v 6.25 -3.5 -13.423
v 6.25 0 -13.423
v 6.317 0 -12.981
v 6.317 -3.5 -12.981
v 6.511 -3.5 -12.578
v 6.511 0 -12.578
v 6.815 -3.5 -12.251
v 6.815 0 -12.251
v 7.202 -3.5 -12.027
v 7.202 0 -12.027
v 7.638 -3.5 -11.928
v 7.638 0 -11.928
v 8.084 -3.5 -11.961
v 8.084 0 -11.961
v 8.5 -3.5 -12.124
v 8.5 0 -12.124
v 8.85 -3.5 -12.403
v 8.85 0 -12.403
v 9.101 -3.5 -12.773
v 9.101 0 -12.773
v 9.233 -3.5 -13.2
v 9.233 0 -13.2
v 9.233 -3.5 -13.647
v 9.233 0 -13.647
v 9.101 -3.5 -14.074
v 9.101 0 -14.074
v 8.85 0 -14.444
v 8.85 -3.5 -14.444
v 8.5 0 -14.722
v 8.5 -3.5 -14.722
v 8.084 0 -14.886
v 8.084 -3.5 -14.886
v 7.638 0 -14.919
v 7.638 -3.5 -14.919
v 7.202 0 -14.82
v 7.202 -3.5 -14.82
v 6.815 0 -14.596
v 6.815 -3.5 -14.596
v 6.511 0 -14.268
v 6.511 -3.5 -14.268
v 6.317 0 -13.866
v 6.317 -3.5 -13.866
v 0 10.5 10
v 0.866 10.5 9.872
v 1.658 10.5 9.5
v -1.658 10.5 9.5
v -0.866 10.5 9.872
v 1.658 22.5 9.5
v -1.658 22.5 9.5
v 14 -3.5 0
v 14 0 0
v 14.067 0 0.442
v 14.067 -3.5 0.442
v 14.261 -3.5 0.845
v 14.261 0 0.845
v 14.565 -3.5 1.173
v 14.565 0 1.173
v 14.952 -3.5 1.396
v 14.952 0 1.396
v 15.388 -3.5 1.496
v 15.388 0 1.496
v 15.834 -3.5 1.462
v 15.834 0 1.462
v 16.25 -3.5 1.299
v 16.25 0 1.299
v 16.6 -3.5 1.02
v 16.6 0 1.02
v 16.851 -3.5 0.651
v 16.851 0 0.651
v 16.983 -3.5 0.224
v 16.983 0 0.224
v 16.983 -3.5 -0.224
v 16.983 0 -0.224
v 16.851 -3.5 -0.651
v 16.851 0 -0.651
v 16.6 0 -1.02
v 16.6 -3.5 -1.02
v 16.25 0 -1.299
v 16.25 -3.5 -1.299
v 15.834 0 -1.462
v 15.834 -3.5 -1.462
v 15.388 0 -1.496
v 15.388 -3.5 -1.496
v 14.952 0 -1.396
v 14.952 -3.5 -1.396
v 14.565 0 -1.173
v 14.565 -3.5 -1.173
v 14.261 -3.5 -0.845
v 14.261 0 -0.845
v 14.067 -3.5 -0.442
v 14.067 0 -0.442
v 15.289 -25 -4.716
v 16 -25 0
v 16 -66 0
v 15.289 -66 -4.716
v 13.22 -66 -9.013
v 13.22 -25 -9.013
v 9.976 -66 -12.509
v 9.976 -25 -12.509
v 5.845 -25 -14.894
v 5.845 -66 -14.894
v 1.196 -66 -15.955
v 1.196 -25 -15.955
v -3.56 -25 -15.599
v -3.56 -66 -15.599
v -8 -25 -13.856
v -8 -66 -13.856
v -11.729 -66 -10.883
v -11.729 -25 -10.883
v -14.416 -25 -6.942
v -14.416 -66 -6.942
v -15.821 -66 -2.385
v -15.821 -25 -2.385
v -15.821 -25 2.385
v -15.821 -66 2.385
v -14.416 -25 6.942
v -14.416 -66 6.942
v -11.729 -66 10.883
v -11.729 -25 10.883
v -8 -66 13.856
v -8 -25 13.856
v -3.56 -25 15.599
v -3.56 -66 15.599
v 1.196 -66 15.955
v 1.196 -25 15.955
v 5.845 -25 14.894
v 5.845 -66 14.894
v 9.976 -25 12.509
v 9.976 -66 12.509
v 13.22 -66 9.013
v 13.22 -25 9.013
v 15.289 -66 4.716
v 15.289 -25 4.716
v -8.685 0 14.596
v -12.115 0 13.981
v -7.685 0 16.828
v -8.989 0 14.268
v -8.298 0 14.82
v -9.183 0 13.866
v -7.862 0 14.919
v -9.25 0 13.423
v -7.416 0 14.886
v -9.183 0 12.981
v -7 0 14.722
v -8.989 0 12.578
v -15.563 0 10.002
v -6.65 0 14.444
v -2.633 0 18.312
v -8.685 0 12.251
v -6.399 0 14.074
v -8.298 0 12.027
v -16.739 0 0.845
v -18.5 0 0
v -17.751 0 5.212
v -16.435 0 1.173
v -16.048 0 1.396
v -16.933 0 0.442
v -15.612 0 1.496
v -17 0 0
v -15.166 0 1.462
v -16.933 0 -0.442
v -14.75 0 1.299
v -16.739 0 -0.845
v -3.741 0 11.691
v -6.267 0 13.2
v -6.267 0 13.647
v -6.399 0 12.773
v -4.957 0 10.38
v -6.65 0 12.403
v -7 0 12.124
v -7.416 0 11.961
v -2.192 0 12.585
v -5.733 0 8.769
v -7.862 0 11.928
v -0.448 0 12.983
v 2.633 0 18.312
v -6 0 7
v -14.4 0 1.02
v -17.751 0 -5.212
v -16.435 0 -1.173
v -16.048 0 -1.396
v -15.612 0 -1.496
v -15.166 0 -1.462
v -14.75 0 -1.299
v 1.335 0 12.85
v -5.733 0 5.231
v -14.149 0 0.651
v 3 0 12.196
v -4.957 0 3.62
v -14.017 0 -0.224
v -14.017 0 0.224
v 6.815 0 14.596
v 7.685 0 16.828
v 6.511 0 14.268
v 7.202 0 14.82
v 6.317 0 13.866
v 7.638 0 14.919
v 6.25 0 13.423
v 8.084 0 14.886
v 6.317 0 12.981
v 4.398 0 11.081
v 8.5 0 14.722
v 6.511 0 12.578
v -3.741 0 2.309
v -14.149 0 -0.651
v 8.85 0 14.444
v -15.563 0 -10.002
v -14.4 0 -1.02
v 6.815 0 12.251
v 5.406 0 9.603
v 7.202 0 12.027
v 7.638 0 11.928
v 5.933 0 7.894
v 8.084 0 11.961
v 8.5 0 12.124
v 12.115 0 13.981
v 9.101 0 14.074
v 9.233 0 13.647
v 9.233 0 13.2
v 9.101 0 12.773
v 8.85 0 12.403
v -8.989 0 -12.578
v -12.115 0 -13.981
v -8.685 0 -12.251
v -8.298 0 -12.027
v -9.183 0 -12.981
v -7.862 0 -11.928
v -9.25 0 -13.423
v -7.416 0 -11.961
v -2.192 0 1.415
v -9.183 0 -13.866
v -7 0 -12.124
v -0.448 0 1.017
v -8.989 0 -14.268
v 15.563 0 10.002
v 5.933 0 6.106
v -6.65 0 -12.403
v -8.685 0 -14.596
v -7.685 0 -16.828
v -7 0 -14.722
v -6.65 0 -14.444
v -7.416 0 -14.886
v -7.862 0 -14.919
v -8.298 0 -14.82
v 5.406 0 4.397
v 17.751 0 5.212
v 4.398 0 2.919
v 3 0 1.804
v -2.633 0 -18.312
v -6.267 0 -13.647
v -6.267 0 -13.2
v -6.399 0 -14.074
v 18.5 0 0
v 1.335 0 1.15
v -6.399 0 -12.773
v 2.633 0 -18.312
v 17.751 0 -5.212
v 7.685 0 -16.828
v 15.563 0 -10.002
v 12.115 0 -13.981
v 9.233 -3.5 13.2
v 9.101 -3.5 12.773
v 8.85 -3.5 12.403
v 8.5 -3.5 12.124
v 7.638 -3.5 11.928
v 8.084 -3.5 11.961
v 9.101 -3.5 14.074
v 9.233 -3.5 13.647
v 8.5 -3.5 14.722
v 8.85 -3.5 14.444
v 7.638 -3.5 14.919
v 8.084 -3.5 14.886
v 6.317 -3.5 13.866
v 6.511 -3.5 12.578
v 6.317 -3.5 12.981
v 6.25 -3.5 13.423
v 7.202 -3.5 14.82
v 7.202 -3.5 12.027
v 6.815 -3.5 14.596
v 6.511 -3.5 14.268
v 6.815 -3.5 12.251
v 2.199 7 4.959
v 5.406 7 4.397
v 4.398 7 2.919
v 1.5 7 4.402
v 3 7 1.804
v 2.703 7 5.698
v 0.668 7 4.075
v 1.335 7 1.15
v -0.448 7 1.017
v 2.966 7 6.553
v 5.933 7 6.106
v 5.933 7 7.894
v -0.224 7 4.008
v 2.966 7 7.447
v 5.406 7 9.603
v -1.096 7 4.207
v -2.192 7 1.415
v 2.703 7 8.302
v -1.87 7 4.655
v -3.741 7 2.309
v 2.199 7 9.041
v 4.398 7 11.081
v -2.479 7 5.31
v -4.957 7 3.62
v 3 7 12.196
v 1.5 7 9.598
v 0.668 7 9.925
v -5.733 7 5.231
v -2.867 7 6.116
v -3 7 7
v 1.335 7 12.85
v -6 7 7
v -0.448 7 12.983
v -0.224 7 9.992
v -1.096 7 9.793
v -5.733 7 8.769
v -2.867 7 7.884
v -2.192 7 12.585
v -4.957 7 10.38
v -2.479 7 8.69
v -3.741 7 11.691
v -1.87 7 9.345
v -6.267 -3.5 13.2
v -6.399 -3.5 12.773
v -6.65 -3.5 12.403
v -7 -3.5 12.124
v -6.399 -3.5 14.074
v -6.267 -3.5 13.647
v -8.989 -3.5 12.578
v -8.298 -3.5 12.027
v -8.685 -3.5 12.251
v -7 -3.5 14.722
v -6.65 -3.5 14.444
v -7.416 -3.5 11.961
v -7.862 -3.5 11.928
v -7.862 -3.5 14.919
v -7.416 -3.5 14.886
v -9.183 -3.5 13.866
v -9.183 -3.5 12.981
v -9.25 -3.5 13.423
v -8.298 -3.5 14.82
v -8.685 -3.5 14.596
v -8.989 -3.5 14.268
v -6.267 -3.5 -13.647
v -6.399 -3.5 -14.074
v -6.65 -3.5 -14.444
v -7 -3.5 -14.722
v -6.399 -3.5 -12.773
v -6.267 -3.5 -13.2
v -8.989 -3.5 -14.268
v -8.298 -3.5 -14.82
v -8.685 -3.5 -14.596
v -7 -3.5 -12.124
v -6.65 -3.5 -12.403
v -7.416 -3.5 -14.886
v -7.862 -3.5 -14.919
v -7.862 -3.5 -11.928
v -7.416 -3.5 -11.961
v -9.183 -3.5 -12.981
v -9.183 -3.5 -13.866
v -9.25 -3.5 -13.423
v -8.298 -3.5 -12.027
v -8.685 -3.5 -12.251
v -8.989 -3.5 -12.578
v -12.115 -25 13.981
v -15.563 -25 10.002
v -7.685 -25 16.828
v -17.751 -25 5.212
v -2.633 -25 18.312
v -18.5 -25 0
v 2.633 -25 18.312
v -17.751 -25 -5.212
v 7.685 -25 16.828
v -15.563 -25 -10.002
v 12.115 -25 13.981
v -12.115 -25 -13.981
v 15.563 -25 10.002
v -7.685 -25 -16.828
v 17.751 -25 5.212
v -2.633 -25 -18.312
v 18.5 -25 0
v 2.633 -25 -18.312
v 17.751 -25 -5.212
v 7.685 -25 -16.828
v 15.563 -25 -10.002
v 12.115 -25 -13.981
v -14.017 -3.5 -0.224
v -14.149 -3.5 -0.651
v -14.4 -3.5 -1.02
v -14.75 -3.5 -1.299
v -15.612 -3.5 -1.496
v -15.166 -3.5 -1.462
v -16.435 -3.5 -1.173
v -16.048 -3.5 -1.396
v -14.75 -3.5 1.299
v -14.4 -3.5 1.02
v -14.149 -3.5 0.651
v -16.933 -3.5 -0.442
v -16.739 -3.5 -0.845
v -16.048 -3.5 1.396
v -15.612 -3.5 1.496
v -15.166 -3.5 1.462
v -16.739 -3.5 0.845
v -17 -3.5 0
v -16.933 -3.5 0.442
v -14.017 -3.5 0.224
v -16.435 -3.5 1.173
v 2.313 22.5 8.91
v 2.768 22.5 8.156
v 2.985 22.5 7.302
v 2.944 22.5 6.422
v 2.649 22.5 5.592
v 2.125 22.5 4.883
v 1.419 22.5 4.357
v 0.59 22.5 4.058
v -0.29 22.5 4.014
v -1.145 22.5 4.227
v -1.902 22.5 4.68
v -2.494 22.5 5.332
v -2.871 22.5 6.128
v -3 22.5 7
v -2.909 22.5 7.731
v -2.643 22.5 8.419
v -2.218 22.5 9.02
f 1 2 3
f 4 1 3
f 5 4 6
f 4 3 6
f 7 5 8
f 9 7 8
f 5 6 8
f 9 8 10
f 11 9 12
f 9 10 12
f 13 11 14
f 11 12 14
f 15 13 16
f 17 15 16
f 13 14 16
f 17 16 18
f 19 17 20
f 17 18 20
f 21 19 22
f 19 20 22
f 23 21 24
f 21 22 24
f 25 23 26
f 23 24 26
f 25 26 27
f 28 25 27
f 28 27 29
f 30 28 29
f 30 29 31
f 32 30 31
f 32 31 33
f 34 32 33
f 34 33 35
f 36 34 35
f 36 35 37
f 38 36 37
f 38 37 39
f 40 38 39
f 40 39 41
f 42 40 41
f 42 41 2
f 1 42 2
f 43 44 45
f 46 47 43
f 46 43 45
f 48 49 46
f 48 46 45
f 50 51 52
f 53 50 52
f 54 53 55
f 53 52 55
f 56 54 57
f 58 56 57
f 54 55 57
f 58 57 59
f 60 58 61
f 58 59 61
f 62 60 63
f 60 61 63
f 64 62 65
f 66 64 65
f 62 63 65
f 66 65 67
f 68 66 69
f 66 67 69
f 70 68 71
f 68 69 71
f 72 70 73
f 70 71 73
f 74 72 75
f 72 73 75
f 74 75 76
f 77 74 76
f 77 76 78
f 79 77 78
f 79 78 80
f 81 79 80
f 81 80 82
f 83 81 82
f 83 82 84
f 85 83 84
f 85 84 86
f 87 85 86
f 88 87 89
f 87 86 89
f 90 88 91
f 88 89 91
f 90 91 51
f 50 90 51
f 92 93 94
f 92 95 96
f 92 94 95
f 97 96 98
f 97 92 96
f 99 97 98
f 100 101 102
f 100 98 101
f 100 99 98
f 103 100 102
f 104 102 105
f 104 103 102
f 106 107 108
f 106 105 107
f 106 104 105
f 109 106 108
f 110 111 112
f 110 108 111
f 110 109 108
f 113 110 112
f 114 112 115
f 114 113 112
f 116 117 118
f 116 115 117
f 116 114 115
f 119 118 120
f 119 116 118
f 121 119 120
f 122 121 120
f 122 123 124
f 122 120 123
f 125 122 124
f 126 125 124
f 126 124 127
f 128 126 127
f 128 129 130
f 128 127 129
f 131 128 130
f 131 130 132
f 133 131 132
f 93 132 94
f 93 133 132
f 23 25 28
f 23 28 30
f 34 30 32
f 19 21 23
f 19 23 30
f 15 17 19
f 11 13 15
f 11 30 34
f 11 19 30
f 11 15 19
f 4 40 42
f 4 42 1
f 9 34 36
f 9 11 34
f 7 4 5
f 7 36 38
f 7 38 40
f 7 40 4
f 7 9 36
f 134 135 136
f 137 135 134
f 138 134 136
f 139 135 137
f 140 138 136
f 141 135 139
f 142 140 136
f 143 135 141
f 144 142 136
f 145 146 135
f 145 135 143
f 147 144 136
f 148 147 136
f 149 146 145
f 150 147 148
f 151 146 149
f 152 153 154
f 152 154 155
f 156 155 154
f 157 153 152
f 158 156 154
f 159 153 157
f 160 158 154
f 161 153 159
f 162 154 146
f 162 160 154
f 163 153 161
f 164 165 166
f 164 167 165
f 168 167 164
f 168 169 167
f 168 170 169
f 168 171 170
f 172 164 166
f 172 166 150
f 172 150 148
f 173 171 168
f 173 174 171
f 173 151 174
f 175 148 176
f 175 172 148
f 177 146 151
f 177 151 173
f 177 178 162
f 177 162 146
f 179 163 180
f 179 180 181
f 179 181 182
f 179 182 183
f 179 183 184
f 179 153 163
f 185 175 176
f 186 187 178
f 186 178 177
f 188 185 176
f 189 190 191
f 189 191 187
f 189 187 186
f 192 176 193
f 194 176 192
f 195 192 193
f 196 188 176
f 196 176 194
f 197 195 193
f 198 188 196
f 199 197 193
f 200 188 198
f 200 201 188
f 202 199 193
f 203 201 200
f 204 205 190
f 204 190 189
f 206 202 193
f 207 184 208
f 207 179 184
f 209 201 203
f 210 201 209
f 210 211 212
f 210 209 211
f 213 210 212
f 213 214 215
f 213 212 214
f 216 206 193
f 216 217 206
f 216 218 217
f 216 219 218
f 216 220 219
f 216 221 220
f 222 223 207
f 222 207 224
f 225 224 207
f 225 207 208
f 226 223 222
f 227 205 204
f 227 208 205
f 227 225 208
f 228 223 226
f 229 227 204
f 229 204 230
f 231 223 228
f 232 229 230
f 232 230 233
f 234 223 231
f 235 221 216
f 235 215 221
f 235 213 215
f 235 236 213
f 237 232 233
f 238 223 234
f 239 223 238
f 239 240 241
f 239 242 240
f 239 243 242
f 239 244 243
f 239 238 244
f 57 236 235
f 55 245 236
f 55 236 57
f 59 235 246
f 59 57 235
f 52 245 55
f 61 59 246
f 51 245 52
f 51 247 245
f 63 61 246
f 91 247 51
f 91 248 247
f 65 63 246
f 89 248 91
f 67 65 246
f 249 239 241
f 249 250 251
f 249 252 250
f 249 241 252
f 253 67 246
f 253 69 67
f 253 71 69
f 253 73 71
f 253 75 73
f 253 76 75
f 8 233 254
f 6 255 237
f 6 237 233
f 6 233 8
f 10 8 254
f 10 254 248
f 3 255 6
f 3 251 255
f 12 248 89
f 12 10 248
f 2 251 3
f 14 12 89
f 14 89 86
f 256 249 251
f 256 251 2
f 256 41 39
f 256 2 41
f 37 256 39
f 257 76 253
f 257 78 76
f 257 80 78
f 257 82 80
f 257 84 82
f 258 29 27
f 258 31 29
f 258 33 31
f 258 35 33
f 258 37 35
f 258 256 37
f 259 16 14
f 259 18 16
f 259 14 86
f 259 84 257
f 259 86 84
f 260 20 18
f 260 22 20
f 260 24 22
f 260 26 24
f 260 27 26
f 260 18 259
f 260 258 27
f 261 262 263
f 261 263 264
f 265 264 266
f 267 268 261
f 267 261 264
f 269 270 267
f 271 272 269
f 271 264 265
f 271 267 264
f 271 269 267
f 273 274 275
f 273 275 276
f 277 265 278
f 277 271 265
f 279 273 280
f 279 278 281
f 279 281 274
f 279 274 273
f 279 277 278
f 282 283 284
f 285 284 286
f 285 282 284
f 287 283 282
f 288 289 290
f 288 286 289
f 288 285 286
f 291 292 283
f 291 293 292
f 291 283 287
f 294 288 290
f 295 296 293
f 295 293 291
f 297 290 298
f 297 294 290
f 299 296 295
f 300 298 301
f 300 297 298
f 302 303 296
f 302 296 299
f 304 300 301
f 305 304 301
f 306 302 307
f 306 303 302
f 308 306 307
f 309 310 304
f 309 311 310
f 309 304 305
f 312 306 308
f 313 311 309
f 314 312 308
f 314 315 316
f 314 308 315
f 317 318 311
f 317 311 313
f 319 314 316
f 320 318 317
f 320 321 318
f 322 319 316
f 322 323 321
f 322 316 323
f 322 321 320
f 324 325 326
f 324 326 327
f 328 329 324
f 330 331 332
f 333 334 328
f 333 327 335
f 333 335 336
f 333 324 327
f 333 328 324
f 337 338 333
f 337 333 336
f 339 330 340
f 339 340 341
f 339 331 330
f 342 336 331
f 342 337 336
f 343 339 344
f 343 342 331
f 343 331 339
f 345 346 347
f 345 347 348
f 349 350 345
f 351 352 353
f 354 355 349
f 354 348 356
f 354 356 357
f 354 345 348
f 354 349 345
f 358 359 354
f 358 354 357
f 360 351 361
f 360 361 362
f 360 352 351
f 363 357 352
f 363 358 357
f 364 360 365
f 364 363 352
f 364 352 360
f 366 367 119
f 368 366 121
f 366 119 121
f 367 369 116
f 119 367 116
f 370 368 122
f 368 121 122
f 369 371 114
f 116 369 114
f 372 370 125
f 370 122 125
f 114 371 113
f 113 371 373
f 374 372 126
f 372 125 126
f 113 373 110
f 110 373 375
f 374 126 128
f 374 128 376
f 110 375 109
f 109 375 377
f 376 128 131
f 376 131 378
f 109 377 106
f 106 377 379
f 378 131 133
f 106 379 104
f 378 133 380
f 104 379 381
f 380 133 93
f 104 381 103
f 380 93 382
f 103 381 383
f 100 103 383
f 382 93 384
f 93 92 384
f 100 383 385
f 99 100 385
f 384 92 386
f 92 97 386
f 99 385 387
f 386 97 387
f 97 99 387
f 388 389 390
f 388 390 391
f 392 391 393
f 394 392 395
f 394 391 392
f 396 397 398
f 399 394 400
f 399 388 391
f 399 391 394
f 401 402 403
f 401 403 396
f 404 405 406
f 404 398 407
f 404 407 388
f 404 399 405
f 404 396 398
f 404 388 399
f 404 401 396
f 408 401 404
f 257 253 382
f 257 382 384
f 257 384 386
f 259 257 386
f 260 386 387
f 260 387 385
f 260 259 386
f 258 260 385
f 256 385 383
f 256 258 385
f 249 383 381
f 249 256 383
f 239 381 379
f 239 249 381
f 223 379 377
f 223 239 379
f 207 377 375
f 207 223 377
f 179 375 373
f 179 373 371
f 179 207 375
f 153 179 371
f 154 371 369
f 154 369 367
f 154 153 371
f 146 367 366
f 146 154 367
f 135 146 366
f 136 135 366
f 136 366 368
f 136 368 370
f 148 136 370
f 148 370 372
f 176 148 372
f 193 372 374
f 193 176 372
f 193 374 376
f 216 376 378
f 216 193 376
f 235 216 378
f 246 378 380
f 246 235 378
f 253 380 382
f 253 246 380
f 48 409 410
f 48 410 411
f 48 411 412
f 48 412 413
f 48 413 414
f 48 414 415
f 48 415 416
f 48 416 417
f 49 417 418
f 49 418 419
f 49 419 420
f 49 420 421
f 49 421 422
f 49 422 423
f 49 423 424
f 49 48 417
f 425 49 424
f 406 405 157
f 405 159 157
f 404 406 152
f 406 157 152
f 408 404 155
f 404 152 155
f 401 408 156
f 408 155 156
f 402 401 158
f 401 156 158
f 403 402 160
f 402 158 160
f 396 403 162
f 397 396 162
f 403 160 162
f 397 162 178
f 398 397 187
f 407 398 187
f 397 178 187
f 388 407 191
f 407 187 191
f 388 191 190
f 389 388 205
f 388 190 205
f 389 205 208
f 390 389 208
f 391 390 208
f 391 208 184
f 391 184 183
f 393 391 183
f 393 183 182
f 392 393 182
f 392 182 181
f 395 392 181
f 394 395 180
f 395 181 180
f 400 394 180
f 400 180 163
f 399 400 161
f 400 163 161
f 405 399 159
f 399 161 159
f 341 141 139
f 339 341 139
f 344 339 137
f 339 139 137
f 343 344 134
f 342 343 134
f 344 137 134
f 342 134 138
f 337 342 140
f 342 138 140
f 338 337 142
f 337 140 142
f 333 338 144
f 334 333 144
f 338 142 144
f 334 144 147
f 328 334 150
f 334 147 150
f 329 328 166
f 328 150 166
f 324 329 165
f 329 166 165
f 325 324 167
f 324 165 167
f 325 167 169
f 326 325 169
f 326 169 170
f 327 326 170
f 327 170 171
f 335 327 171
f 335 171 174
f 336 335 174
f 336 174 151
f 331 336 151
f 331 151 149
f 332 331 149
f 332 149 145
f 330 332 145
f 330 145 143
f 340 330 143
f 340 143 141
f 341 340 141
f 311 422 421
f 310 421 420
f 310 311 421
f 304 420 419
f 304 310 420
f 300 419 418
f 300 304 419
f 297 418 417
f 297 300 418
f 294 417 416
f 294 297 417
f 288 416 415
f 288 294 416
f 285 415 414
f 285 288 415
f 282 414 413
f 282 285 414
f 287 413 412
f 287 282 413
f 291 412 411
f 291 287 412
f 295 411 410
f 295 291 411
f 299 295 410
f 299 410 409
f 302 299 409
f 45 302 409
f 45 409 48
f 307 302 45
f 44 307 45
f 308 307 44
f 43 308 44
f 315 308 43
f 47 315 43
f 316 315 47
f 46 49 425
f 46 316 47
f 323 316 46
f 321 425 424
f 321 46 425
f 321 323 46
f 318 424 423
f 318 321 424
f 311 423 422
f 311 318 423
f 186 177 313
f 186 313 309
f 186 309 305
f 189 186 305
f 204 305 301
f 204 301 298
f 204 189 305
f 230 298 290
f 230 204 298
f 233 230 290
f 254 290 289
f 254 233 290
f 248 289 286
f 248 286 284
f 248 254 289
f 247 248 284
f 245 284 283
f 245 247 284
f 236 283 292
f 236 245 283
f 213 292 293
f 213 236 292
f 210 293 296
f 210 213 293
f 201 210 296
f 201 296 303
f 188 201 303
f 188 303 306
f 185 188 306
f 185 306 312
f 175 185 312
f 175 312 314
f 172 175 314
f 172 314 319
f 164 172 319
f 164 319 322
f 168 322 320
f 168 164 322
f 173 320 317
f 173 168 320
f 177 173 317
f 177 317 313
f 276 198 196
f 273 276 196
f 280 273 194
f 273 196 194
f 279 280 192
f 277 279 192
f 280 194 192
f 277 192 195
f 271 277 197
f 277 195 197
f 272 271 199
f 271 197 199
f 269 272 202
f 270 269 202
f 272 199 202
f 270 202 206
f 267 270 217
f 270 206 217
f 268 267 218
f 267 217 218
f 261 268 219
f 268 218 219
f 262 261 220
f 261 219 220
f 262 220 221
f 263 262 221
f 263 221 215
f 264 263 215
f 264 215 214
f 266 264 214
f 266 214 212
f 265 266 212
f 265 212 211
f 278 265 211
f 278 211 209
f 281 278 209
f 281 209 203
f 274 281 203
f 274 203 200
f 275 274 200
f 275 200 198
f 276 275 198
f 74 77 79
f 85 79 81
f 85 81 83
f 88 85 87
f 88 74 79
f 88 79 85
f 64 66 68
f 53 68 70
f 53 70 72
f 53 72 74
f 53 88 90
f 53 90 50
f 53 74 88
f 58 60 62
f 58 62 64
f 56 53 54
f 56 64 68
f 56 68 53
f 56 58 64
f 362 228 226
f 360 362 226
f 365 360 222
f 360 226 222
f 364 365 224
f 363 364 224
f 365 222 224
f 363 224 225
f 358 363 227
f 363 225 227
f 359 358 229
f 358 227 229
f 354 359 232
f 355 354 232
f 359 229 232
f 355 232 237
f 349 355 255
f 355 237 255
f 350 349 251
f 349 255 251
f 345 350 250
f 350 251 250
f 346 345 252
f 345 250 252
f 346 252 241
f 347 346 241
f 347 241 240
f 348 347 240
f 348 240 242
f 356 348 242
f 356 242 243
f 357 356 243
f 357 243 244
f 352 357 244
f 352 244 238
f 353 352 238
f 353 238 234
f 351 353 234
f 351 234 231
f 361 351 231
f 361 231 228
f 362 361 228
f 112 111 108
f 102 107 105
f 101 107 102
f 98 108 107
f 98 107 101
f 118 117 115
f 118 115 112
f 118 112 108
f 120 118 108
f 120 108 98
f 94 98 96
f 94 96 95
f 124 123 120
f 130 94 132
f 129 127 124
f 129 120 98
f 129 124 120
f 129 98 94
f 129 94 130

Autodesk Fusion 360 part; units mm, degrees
sketch "Sketch1" plane through (0, 0, 0) normal (0, 1, 0) x (1, 0, 0)
  circle A0 centre (0, 0) radius 18.5
  dimension "d1" = 37
extrude "Extrude1" add sketch "Sketch1" against normal blind 25
sketch "Sketch2" plane through (0, -25, 0) normal (0, -1, 0) x (1, 0, 0)
  circle A0 centre (0, 0) radius 18.5
  circle A1 centre (0, 0) radius 16
  dimension "d4" = 32
extrude "Extrude2" add sketch "Sketch2" along normal blind 41 contours A1
sketch "Sketch3" plane through (0, 0, 0) normal (0, 1, 0) x (-1, 0, 0)
  circle A0 centre (0, 0) radius 18.5
  line L0 (0, 0) -> (0, 7)
  circle A1 centre (0, 7) radius 6
  dimension "d7" = 7
  dimension "d8" = 12
extrude "Extrude3" add sketch "Sketch3" along normal blind 7 contours A1
sketch "Sketch4" plane through (0, 7, 0) normal (0, 1, 0) x (-1, 0, 0)
  circle A0 centre (0, 7) radius 6
  circle A1 centre (0, 7) radius 3
  dimension "d11" = 6
extrude "Extrude4" add sketch "Sketch4" along normal blind 15.5 contours A1
sketch "Sketch5" plane through (0, 0, 0) normal (0, 1, 0) x (-1, 0, 0)
  circle A0 centre (0, 7) radius 6
  circle A1 centre (0, 0) radius 18.5
  line L0 (0, 0) -> (15.5, 0)
  circle A2 centre (15.5, 0) radius 1.5
  circle A3 centre (7.75, 13.4234) radius 1.5
  circle A4 centre (-7.75, 13.4234) radius 1.5
  circle A5 centre (-15.5, 0) radius 1.5
  circle A6 centre (-7.75, -13.4234) radius 1.5
  circle A7 centre (7.75, -13.4234) radius 1.5
  dimension "d14" = 3
  dimension "d15" = 15.5
  dimension "d17" = 360
extrude "Extrude5" cut sketch "Sketch5" against normal blind 3.5 contours A2 | A3 | A4 | A5 | A6 | A7
sketch "Sketch6" plane through (0, 22.5, 0) normal (0, 1, 0) x (-1, 0, 0)
  circle A0 centre (0, 7) radius 3
  circle A1 centre (0, 7) radius 3
  line L0 (0, 7) -> (0, 9.5)
  line L1 (0, 9.5) -> (-1.6583, 9.5)
  line L2 (0, 9.5) -> (1.6583, 9.5)
extrude "Extrude6" cut sketch "Sketch6" against normal blind 12 contours A0 A1 L1 L2 picked at (-0.1459, 9.8226)
